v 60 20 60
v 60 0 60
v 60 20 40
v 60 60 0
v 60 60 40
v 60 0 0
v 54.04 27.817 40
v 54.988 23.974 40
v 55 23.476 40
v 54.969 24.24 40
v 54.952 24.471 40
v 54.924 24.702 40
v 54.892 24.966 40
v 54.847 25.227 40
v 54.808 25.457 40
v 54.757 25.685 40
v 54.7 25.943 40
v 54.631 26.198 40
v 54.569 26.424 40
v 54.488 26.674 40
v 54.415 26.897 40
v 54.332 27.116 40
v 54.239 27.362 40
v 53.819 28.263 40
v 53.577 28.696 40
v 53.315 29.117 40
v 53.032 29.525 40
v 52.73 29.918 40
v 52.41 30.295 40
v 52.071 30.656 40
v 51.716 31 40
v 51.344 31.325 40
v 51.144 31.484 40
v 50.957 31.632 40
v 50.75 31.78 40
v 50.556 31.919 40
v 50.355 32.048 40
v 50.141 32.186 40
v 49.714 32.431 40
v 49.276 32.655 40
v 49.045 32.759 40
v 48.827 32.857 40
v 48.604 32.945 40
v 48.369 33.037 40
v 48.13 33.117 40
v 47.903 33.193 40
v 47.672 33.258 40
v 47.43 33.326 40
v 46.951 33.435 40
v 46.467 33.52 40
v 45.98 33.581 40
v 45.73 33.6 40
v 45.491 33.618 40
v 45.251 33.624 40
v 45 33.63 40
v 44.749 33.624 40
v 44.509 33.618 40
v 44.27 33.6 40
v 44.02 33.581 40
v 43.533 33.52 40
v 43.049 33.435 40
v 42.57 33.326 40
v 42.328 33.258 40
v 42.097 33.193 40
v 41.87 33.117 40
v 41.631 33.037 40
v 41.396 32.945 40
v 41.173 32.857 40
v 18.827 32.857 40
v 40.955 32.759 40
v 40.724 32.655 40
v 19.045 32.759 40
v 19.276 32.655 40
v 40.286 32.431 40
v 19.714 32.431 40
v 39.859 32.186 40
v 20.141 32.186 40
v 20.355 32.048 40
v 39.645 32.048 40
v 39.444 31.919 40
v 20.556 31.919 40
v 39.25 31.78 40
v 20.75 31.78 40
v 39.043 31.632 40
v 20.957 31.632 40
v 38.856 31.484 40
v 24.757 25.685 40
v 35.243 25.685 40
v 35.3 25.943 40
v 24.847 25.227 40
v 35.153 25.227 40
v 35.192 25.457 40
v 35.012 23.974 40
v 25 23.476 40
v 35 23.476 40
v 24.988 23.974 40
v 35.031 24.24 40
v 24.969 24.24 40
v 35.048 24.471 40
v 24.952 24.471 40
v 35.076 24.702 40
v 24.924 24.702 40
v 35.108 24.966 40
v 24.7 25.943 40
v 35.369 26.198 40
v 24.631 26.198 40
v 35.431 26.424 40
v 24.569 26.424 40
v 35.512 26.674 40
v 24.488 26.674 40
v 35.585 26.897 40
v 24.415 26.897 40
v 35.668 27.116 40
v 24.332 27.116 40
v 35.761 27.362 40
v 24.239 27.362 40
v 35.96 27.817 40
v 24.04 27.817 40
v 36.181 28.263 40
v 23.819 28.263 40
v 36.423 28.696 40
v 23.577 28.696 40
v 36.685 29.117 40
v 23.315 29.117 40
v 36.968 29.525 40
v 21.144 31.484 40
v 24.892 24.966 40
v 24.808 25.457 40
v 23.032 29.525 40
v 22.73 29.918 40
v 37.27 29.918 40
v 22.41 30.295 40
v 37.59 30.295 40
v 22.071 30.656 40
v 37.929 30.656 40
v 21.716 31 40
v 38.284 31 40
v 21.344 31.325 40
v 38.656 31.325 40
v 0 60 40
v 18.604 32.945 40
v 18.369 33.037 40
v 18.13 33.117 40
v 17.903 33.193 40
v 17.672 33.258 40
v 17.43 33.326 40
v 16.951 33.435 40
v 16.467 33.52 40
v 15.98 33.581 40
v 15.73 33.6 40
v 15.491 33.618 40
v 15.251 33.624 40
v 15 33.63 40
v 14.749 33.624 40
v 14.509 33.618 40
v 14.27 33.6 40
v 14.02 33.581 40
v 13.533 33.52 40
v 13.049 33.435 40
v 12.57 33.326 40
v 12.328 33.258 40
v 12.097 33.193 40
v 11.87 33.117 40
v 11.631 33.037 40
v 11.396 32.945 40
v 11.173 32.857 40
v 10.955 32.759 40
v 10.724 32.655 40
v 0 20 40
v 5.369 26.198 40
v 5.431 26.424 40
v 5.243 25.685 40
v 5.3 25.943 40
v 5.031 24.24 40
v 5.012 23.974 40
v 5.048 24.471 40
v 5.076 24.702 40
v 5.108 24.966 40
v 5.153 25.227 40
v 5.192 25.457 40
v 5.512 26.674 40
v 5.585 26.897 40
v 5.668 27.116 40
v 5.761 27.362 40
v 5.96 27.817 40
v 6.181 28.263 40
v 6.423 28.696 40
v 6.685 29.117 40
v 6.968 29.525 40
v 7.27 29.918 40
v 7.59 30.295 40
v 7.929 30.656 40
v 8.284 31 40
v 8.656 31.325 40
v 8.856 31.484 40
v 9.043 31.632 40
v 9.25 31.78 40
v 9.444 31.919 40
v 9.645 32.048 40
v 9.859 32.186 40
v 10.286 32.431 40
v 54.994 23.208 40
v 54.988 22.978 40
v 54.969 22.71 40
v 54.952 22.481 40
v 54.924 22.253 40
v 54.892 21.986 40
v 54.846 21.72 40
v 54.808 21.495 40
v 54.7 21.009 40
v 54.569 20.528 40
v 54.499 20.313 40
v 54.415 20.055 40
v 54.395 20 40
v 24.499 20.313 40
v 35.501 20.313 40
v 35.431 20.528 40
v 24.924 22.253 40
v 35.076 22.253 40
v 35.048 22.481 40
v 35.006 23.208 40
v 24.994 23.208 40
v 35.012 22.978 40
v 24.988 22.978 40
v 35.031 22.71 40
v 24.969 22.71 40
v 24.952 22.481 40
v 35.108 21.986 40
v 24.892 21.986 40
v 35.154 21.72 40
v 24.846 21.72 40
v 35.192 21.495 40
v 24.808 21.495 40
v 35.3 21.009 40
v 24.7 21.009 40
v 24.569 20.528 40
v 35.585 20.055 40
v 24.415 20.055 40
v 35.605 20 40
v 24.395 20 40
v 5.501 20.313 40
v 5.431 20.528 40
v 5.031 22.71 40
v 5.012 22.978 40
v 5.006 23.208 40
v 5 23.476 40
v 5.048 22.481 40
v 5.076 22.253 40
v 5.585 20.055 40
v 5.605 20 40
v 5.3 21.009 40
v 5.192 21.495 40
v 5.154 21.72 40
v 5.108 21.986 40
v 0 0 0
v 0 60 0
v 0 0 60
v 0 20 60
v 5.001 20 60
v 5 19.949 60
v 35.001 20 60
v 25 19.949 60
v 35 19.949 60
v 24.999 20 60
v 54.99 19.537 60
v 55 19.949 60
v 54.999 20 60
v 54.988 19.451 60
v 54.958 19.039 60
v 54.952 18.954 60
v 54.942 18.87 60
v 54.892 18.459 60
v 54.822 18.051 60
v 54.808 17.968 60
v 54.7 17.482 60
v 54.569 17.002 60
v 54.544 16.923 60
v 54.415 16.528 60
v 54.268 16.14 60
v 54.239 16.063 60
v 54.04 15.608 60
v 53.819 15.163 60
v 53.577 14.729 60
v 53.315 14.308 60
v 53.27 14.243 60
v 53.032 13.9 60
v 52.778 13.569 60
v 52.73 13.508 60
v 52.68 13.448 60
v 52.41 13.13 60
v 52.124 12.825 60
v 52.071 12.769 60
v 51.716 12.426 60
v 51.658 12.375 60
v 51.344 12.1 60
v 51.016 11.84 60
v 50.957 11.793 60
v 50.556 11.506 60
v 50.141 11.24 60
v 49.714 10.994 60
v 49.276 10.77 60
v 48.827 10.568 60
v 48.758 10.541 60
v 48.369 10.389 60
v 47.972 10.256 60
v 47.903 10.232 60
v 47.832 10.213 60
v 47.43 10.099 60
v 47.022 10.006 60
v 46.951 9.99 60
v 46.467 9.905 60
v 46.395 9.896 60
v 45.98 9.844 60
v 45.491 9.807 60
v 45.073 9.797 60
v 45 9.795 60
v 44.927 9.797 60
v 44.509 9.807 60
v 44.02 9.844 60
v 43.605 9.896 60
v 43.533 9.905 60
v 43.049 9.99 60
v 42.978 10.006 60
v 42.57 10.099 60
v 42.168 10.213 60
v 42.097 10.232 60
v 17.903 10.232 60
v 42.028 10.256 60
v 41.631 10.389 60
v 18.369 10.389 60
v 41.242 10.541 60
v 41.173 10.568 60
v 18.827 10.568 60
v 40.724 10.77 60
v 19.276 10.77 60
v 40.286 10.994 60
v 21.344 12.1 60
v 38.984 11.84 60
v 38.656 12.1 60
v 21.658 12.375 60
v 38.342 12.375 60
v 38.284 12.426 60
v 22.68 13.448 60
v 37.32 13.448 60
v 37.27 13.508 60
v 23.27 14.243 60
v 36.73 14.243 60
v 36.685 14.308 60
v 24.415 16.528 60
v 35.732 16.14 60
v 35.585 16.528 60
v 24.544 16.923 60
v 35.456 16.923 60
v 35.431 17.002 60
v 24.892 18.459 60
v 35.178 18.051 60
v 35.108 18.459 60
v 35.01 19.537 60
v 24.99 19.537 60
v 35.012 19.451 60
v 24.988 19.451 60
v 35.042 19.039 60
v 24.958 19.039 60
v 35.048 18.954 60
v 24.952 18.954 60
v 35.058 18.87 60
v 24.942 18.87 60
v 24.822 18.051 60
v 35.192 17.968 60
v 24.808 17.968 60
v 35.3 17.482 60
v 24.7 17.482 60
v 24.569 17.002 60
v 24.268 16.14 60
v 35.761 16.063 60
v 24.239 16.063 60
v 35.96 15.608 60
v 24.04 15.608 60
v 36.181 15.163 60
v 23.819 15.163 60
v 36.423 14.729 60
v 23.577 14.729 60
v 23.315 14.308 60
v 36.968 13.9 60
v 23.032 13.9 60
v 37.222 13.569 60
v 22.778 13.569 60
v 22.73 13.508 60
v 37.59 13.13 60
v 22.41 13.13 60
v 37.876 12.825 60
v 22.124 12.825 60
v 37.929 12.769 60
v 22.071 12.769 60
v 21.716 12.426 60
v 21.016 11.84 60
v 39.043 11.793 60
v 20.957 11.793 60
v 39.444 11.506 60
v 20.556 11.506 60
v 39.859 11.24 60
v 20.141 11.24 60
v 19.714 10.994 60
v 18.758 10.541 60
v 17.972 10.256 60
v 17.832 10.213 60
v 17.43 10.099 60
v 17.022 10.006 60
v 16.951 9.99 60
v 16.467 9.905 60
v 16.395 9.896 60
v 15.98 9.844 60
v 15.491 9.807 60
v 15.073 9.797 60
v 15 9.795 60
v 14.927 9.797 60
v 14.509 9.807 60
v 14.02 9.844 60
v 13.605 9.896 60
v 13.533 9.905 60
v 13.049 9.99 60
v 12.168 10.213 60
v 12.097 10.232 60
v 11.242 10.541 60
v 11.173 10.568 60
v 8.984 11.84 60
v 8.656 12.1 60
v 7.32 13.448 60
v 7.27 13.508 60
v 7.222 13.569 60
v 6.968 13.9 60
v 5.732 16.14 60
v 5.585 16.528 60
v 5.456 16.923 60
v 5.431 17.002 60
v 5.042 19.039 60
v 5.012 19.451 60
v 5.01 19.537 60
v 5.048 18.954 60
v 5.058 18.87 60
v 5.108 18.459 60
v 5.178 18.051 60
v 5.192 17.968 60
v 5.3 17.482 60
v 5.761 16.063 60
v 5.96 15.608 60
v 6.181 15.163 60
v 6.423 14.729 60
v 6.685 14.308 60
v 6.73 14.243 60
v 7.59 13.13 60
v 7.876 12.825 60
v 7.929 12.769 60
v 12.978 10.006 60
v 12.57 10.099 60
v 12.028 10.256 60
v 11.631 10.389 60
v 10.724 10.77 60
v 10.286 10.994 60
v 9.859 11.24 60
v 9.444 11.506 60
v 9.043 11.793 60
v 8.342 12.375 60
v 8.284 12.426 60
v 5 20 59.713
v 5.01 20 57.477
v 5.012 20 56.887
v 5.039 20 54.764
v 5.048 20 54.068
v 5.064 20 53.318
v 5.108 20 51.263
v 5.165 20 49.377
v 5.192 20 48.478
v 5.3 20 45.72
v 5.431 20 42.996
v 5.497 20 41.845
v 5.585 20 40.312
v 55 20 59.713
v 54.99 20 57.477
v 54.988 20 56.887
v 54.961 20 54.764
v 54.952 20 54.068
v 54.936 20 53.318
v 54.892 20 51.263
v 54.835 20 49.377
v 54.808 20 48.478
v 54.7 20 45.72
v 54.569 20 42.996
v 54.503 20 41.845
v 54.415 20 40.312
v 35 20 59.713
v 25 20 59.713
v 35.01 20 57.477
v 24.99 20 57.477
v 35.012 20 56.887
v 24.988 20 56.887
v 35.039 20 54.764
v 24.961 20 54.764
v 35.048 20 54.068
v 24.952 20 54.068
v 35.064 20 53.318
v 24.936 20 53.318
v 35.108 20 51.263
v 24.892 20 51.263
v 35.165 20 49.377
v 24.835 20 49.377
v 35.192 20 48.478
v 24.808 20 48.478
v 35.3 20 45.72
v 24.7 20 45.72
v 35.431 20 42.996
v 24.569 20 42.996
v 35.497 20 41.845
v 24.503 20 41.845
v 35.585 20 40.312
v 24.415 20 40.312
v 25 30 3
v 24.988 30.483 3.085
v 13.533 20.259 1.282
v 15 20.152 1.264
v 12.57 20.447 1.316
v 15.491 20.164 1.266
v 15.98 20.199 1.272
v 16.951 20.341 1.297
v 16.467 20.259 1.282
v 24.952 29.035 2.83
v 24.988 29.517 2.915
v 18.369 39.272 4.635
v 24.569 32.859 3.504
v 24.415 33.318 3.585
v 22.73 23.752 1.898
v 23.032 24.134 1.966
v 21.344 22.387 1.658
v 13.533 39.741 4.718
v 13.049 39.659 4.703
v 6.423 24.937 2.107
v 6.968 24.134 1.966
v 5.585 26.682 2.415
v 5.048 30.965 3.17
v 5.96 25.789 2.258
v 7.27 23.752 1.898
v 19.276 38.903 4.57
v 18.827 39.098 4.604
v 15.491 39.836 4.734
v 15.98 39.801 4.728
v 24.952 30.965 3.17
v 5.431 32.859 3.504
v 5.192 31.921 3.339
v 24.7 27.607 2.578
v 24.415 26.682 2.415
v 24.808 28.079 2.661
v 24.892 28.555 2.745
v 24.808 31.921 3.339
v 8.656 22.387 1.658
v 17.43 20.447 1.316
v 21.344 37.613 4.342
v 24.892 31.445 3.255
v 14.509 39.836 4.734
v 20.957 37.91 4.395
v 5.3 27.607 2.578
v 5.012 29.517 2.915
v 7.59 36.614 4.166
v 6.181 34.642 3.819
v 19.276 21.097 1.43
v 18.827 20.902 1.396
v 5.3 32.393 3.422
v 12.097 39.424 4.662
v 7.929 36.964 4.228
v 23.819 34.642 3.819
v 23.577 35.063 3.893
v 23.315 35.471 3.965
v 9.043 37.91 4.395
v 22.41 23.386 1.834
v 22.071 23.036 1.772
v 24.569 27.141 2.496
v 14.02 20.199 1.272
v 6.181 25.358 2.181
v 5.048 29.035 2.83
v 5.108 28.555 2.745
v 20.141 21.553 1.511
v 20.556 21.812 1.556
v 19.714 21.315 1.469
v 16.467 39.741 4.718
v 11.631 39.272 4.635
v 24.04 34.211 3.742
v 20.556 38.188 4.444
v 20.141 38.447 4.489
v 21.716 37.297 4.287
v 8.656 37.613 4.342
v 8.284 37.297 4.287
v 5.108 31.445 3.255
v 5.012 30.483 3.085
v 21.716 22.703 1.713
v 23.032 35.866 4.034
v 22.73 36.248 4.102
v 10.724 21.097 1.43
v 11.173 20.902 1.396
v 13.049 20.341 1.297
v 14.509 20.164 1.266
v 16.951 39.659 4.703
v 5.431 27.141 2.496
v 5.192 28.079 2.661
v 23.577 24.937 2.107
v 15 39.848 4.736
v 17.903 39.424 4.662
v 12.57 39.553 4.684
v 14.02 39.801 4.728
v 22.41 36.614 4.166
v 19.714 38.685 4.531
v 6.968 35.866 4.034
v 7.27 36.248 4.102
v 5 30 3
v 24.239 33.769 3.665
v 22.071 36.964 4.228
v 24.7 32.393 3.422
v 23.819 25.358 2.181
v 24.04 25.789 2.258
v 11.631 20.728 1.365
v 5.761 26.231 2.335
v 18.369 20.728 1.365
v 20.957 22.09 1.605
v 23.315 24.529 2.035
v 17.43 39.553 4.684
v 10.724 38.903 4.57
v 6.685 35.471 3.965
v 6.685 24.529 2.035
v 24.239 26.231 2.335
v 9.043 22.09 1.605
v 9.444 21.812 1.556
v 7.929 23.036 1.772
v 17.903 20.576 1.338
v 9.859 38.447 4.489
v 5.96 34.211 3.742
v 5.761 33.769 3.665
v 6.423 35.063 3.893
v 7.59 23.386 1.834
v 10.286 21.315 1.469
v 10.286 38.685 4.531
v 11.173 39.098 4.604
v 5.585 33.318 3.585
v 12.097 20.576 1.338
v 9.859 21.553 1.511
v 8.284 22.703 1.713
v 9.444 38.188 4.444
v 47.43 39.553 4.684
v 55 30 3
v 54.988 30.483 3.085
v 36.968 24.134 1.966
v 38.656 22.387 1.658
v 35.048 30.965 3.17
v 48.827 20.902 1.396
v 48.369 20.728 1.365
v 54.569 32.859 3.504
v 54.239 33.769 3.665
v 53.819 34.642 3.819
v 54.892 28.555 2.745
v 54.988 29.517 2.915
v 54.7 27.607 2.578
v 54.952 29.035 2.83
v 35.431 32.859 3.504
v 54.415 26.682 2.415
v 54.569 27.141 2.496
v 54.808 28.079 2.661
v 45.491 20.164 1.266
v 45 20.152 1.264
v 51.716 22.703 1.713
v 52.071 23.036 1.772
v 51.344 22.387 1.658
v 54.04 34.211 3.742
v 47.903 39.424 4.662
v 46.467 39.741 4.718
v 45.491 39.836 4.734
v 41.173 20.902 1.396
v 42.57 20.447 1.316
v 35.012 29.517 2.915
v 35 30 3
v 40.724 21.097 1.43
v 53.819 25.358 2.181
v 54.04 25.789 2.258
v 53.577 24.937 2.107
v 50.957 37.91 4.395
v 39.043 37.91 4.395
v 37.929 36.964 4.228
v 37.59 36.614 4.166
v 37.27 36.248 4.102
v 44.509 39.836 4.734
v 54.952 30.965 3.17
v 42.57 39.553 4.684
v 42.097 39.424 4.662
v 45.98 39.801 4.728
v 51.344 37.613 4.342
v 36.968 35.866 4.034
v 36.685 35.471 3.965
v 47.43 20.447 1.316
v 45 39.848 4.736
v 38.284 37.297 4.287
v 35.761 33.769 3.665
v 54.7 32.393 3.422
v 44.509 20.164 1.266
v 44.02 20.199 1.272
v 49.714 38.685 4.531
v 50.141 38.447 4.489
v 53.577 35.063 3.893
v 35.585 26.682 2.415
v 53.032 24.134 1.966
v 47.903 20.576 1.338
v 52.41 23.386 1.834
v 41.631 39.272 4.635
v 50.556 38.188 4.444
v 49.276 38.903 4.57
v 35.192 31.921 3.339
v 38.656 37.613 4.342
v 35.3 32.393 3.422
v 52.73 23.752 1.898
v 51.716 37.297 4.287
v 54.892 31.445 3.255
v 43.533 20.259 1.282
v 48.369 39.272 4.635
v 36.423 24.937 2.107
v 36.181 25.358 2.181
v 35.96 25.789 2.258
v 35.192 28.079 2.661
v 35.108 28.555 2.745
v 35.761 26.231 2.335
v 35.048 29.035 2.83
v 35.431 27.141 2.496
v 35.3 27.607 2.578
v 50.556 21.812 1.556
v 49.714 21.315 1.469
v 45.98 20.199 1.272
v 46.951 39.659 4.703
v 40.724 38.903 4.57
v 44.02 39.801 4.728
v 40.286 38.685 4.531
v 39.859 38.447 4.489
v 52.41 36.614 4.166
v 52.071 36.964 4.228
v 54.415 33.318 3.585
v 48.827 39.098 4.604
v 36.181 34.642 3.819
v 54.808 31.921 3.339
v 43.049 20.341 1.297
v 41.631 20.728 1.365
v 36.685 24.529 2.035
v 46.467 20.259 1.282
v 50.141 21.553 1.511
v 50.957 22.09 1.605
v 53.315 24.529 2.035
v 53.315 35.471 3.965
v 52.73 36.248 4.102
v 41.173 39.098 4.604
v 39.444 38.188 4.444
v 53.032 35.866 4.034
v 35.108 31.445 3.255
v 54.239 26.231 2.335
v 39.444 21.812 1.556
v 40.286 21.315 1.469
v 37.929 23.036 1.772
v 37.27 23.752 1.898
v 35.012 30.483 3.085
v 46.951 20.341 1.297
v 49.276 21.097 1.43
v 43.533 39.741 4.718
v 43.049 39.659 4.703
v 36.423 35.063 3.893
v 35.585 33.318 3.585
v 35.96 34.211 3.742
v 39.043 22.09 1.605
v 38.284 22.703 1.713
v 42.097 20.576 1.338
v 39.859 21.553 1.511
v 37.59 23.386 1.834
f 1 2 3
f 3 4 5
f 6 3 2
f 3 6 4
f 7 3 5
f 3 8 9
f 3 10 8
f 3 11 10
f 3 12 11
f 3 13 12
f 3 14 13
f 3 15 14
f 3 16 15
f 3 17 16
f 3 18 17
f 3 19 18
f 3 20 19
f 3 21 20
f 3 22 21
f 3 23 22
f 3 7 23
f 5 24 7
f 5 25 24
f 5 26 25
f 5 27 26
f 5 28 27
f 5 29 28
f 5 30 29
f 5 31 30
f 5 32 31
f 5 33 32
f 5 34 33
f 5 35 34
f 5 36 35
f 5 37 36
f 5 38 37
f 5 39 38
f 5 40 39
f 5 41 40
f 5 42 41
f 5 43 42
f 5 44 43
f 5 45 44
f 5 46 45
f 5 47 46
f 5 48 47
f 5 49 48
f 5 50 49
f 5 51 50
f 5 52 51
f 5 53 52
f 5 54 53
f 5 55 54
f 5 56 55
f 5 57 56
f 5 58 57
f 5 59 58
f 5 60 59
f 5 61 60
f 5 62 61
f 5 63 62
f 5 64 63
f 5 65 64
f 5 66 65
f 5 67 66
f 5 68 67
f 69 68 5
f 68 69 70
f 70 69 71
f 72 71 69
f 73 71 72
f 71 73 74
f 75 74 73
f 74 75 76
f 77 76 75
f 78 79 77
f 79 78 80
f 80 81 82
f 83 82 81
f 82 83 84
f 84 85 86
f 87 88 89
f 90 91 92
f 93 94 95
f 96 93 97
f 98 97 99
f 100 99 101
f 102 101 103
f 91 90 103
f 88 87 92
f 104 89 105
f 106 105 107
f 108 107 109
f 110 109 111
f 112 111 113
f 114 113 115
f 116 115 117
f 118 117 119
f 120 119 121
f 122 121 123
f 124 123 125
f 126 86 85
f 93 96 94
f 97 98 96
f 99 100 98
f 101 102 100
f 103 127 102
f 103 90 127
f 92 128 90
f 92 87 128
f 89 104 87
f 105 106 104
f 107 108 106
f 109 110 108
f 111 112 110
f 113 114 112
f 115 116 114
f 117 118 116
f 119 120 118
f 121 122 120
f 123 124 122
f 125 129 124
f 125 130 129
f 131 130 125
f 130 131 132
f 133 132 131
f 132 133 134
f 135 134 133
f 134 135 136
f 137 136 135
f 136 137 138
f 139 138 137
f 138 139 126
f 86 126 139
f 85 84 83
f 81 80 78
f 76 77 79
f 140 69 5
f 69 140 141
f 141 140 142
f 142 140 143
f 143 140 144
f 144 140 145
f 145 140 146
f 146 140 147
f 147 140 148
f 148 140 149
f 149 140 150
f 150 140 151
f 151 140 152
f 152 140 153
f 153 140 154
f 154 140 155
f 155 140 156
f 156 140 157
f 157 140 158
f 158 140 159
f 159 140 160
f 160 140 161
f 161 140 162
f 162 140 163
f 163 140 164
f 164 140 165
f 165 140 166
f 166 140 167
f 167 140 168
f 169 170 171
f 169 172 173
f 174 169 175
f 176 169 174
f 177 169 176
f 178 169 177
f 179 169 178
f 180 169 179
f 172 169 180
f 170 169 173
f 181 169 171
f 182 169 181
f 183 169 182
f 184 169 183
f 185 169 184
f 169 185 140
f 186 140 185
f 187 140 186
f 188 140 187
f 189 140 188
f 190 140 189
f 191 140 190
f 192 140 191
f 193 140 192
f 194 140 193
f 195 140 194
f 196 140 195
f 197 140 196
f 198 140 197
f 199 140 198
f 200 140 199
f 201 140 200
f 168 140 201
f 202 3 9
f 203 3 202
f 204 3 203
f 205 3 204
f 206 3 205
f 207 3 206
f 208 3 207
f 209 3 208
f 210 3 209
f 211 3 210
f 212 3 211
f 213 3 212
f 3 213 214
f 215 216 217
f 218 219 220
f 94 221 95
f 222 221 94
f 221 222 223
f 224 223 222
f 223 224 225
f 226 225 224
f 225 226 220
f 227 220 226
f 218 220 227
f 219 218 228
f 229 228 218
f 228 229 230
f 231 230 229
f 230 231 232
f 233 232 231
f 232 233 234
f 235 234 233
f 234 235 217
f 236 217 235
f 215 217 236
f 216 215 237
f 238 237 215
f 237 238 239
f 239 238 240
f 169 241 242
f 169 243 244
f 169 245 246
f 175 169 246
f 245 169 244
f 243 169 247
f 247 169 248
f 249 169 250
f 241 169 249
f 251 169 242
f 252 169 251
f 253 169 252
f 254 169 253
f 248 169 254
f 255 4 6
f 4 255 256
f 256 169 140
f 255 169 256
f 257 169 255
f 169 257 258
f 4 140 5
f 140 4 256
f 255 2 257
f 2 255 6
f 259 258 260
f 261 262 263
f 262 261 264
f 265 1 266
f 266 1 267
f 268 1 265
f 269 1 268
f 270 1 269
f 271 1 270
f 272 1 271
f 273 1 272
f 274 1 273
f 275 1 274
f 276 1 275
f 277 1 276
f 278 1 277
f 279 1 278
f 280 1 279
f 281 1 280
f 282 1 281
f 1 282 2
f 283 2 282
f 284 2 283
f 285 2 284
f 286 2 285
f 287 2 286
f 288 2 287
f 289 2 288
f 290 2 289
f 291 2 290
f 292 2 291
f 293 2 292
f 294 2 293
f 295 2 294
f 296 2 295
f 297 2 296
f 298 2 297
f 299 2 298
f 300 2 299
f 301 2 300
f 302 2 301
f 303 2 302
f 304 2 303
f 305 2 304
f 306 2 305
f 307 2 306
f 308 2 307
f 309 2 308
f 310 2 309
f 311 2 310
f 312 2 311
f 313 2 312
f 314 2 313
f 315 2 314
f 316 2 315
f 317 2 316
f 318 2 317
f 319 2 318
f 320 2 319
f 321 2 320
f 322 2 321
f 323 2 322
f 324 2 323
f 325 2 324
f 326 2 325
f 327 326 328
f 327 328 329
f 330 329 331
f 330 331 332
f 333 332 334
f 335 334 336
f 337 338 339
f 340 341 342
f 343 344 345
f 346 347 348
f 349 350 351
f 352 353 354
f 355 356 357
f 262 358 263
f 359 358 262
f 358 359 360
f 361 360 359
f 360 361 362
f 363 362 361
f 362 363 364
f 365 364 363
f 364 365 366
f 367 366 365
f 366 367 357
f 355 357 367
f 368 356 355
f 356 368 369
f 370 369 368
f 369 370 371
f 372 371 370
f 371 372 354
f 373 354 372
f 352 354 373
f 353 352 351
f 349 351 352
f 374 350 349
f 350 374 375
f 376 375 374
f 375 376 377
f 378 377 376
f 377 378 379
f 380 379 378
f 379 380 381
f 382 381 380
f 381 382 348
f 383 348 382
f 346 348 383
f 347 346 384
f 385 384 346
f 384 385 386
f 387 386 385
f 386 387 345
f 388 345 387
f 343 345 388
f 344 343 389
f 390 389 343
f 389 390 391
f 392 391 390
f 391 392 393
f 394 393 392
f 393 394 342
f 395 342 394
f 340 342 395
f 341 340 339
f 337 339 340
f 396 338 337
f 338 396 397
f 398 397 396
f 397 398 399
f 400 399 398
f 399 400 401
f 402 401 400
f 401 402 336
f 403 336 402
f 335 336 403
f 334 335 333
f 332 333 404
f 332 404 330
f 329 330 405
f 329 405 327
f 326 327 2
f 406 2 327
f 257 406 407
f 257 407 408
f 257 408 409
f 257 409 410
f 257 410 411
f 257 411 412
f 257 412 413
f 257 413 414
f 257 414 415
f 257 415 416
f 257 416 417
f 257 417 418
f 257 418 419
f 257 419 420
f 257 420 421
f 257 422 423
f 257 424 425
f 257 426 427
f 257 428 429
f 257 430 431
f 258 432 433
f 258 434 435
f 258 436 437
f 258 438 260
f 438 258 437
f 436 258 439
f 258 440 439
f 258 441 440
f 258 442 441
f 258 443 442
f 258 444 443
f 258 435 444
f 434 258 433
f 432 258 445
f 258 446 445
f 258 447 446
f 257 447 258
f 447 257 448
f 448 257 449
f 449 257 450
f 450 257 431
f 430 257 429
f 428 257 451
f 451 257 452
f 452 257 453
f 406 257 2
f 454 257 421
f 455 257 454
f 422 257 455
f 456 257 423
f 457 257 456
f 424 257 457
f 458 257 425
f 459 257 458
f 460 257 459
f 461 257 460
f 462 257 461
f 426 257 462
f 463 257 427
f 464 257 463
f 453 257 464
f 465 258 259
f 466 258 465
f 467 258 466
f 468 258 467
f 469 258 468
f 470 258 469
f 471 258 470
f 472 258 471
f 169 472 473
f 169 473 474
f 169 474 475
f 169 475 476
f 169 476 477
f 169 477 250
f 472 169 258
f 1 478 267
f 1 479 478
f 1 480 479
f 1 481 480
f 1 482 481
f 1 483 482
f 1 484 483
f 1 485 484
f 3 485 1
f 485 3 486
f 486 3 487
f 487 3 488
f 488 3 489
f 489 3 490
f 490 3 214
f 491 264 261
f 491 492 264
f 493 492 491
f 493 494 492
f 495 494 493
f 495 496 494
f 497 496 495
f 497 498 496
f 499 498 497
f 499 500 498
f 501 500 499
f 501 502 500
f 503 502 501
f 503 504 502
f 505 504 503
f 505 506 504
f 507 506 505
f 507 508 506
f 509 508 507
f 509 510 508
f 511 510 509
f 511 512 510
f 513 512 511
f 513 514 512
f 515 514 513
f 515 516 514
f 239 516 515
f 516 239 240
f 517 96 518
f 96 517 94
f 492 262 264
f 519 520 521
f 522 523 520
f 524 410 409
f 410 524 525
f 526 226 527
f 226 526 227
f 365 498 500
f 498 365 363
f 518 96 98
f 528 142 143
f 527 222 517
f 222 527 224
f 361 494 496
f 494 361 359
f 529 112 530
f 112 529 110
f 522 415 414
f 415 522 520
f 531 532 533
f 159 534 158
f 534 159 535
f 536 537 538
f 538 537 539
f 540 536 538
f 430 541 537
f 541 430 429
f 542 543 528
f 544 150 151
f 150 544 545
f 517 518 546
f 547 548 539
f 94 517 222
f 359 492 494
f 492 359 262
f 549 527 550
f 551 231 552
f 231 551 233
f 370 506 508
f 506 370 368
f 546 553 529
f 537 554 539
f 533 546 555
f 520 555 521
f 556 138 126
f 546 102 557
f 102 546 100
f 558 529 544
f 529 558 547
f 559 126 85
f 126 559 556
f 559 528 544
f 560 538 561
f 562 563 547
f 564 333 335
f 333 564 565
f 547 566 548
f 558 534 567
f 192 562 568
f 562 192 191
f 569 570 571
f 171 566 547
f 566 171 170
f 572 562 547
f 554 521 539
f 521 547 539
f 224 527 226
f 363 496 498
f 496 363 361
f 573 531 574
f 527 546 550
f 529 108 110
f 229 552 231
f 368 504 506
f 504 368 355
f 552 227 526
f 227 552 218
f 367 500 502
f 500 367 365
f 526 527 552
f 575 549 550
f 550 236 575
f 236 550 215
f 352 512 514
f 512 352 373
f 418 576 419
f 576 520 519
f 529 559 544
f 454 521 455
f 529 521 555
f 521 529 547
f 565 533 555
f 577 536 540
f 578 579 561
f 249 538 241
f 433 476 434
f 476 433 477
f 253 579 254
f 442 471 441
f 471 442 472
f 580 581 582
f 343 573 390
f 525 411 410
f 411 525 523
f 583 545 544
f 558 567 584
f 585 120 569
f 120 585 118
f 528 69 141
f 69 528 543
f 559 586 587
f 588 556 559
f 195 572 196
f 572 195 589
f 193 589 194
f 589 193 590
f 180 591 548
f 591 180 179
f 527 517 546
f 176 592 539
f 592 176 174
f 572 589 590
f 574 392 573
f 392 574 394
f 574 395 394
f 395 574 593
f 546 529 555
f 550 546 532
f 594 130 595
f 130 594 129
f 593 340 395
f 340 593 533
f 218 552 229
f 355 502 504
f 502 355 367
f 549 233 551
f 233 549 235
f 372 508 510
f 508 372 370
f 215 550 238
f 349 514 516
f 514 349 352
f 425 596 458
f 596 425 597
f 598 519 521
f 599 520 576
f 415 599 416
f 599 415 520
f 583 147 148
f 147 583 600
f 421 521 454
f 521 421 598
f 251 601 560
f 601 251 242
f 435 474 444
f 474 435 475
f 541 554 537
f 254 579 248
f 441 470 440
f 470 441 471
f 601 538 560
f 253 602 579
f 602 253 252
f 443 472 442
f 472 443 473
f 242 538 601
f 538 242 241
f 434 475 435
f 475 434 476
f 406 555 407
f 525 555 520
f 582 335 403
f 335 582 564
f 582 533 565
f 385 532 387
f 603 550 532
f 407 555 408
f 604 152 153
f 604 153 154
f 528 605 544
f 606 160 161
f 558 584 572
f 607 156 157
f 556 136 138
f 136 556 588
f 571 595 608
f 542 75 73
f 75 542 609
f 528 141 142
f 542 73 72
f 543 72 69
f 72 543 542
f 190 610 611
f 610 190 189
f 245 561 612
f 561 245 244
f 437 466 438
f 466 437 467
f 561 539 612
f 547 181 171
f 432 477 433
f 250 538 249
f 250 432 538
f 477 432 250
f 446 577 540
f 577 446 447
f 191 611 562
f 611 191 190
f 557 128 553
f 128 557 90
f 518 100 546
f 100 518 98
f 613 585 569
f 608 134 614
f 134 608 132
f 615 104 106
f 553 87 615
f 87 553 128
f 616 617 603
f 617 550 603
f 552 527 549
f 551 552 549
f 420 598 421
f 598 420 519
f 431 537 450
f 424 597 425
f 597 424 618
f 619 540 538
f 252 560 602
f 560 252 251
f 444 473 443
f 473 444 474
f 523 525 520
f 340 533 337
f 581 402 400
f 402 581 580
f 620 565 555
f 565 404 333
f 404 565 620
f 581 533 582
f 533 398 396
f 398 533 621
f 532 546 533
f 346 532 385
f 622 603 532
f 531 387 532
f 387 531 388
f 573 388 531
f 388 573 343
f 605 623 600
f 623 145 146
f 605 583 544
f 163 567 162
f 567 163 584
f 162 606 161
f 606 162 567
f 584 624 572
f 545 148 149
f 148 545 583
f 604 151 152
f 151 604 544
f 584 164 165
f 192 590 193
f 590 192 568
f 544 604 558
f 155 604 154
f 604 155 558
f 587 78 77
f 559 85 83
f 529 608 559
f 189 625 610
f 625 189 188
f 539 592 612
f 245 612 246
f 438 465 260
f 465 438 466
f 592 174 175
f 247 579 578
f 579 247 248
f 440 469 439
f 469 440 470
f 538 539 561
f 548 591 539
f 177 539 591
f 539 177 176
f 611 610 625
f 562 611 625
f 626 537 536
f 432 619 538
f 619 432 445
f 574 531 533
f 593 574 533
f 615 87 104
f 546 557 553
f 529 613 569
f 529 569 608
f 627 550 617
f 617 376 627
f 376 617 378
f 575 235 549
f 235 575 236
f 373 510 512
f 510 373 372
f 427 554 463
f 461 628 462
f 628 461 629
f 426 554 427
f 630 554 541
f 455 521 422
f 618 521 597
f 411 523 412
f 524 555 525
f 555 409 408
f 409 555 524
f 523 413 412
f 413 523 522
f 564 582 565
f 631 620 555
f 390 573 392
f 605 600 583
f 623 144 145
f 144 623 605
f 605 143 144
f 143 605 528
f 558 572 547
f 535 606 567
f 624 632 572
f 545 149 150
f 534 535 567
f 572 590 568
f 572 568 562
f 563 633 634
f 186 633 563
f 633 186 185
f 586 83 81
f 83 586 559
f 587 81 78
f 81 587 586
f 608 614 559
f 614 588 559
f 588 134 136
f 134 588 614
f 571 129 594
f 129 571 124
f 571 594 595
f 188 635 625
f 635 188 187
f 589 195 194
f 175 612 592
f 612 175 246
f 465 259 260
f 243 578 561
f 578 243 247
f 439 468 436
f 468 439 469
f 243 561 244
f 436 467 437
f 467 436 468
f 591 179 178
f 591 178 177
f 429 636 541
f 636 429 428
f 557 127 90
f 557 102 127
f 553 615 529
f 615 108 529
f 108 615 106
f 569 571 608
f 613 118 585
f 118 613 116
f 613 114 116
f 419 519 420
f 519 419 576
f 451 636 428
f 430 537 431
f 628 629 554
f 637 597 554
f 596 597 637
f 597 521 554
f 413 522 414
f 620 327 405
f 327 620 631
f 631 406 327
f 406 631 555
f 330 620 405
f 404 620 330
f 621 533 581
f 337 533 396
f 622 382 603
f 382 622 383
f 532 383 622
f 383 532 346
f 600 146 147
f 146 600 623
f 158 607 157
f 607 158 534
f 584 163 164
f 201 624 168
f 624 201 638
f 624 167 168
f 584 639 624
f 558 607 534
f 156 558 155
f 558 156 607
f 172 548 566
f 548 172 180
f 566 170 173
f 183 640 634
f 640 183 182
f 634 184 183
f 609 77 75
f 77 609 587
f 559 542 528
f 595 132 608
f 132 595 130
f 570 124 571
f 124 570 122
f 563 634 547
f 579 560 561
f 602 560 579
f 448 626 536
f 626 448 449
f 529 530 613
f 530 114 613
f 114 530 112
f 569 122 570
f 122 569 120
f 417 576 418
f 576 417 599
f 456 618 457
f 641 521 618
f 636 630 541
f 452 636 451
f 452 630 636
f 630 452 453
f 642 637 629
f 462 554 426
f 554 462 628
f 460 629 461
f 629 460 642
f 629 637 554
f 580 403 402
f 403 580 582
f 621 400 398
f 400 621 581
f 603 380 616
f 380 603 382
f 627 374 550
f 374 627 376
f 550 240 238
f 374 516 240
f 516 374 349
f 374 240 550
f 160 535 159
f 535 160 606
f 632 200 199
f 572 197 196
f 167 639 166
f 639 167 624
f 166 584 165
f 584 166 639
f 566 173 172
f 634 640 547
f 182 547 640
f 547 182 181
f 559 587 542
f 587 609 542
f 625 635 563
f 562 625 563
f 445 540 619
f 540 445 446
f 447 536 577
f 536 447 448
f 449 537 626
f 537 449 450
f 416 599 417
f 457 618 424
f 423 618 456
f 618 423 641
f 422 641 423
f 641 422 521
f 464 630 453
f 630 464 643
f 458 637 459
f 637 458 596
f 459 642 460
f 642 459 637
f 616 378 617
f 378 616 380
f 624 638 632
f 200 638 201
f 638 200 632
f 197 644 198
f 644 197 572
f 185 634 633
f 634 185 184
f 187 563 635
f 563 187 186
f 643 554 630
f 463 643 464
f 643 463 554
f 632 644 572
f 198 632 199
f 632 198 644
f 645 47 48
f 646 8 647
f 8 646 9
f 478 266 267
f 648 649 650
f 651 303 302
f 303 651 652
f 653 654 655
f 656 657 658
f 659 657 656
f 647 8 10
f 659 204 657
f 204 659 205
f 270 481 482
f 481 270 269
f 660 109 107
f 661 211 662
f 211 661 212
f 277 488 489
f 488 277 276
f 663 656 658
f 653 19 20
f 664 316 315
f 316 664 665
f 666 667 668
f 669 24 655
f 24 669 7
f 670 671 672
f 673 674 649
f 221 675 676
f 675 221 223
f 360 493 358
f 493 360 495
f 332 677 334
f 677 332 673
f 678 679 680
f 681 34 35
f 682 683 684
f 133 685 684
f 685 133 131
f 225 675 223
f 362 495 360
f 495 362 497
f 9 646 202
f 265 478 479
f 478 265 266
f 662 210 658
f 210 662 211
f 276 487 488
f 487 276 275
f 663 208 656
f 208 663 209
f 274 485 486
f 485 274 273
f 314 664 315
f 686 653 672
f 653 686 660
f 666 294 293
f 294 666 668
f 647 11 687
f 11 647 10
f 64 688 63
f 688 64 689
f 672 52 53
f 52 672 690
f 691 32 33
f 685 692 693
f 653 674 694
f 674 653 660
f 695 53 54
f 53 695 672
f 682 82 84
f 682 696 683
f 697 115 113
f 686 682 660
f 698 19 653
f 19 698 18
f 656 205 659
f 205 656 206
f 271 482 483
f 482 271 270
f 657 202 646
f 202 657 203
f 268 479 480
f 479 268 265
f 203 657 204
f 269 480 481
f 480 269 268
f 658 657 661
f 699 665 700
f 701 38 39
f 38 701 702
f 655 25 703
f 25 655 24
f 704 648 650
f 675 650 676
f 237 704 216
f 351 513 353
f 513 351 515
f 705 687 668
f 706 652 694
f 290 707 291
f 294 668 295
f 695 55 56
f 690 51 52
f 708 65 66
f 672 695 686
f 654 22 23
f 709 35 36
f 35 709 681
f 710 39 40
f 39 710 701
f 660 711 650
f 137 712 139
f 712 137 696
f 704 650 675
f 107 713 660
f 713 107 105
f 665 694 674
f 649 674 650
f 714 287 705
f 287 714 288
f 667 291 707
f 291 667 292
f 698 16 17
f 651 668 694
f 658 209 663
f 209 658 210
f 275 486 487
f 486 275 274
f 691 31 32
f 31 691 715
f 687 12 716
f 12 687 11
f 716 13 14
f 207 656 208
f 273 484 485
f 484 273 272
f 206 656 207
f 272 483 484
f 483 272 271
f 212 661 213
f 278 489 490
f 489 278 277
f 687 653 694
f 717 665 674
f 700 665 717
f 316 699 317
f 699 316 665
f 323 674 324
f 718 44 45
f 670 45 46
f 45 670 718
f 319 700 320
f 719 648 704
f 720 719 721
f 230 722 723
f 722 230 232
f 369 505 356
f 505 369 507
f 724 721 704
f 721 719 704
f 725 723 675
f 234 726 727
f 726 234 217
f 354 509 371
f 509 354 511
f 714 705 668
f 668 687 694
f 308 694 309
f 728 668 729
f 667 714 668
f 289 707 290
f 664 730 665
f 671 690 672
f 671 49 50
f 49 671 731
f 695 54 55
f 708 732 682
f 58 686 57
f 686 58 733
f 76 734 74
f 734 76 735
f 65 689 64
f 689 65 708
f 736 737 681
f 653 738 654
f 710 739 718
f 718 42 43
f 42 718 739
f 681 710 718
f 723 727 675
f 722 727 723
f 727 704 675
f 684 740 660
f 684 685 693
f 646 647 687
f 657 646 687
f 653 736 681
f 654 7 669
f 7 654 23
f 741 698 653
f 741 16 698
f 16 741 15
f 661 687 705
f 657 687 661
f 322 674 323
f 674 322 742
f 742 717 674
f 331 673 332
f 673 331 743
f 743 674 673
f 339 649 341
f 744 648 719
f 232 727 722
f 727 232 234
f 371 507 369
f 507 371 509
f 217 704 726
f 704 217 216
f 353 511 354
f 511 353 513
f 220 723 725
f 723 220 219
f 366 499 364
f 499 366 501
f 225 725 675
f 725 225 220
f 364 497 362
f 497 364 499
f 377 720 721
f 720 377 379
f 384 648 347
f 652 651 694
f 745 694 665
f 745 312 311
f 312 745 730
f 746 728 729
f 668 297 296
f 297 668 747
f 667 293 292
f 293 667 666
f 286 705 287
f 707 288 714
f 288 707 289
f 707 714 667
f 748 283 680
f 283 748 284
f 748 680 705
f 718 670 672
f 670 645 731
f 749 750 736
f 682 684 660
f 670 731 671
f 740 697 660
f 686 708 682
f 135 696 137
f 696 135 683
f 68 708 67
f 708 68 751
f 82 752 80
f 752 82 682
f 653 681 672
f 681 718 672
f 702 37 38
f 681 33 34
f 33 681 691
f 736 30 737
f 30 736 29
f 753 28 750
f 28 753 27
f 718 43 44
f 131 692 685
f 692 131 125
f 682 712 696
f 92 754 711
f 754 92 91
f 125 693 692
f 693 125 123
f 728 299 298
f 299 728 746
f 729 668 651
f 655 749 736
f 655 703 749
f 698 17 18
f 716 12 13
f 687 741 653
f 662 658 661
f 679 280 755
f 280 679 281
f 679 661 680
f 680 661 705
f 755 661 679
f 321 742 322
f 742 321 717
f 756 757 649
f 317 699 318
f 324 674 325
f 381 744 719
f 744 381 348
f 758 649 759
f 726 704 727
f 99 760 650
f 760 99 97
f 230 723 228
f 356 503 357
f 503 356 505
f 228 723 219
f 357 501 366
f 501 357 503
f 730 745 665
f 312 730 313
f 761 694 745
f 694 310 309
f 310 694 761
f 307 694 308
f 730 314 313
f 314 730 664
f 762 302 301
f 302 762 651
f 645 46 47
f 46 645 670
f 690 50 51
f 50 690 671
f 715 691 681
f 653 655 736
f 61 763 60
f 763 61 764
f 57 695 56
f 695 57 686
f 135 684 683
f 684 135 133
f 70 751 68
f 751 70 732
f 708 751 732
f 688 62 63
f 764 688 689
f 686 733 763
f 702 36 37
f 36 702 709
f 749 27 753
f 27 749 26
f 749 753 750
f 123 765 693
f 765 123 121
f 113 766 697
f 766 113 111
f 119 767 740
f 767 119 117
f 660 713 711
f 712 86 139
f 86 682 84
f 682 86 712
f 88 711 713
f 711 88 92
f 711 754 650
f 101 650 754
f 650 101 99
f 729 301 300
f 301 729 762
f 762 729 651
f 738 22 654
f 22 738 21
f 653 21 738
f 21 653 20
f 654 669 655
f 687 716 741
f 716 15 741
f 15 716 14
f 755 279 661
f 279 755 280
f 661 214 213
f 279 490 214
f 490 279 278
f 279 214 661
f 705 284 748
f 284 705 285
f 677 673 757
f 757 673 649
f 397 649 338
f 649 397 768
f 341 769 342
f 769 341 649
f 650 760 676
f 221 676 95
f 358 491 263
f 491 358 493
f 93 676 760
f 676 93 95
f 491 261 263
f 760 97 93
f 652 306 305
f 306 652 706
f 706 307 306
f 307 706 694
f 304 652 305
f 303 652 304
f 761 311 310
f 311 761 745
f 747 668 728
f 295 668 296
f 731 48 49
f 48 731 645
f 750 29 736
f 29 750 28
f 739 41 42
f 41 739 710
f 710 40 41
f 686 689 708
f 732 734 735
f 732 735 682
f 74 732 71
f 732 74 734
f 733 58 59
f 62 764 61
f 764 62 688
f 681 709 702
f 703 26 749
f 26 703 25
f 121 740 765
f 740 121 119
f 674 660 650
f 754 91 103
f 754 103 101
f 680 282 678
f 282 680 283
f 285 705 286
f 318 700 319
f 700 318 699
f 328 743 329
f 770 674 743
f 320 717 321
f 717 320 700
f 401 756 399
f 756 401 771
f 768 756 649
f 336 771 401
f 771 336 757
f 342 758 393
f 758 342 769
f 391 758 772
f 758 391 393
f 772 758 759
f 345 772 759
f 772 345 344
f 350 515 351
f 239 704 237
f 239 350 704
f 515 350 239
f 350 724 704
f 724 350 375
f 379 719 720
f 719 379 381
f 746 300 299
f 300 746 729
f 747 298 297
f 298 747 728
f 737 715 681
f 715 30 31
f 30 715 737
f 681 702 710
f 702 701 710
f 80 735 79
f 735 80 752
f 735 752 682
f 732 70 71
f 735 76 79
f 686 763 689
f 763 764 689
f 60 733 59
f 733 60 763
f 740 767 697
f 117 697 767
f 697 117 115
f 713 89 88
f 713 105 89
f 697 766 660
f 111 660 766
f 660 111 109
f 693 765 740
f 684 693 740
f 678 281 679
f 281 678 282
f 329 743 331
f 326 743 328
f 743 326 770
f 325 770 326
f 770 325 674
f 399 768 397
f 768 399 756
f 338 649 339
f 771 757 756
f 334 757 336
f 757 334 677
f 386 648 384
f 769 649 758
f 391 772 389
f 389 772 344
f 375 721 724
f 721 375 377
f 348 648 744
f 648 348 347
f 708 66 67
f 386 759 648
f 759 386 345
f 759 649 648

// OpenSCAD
$fn = 128;

difference() {
	union() {
		cube([60,60,40]);
		translate([0,0,40])
			cube([60, 20, 20]);	
	}

	translate([15, 30, 3]){
		rotate([10, 0, 0])
			cylinder(h=70, r=10);
				translate([30, 0, 0]){
					rotate([10, 0, 0])
						cylinder(h=70, r=10);
				}	
	}
}
